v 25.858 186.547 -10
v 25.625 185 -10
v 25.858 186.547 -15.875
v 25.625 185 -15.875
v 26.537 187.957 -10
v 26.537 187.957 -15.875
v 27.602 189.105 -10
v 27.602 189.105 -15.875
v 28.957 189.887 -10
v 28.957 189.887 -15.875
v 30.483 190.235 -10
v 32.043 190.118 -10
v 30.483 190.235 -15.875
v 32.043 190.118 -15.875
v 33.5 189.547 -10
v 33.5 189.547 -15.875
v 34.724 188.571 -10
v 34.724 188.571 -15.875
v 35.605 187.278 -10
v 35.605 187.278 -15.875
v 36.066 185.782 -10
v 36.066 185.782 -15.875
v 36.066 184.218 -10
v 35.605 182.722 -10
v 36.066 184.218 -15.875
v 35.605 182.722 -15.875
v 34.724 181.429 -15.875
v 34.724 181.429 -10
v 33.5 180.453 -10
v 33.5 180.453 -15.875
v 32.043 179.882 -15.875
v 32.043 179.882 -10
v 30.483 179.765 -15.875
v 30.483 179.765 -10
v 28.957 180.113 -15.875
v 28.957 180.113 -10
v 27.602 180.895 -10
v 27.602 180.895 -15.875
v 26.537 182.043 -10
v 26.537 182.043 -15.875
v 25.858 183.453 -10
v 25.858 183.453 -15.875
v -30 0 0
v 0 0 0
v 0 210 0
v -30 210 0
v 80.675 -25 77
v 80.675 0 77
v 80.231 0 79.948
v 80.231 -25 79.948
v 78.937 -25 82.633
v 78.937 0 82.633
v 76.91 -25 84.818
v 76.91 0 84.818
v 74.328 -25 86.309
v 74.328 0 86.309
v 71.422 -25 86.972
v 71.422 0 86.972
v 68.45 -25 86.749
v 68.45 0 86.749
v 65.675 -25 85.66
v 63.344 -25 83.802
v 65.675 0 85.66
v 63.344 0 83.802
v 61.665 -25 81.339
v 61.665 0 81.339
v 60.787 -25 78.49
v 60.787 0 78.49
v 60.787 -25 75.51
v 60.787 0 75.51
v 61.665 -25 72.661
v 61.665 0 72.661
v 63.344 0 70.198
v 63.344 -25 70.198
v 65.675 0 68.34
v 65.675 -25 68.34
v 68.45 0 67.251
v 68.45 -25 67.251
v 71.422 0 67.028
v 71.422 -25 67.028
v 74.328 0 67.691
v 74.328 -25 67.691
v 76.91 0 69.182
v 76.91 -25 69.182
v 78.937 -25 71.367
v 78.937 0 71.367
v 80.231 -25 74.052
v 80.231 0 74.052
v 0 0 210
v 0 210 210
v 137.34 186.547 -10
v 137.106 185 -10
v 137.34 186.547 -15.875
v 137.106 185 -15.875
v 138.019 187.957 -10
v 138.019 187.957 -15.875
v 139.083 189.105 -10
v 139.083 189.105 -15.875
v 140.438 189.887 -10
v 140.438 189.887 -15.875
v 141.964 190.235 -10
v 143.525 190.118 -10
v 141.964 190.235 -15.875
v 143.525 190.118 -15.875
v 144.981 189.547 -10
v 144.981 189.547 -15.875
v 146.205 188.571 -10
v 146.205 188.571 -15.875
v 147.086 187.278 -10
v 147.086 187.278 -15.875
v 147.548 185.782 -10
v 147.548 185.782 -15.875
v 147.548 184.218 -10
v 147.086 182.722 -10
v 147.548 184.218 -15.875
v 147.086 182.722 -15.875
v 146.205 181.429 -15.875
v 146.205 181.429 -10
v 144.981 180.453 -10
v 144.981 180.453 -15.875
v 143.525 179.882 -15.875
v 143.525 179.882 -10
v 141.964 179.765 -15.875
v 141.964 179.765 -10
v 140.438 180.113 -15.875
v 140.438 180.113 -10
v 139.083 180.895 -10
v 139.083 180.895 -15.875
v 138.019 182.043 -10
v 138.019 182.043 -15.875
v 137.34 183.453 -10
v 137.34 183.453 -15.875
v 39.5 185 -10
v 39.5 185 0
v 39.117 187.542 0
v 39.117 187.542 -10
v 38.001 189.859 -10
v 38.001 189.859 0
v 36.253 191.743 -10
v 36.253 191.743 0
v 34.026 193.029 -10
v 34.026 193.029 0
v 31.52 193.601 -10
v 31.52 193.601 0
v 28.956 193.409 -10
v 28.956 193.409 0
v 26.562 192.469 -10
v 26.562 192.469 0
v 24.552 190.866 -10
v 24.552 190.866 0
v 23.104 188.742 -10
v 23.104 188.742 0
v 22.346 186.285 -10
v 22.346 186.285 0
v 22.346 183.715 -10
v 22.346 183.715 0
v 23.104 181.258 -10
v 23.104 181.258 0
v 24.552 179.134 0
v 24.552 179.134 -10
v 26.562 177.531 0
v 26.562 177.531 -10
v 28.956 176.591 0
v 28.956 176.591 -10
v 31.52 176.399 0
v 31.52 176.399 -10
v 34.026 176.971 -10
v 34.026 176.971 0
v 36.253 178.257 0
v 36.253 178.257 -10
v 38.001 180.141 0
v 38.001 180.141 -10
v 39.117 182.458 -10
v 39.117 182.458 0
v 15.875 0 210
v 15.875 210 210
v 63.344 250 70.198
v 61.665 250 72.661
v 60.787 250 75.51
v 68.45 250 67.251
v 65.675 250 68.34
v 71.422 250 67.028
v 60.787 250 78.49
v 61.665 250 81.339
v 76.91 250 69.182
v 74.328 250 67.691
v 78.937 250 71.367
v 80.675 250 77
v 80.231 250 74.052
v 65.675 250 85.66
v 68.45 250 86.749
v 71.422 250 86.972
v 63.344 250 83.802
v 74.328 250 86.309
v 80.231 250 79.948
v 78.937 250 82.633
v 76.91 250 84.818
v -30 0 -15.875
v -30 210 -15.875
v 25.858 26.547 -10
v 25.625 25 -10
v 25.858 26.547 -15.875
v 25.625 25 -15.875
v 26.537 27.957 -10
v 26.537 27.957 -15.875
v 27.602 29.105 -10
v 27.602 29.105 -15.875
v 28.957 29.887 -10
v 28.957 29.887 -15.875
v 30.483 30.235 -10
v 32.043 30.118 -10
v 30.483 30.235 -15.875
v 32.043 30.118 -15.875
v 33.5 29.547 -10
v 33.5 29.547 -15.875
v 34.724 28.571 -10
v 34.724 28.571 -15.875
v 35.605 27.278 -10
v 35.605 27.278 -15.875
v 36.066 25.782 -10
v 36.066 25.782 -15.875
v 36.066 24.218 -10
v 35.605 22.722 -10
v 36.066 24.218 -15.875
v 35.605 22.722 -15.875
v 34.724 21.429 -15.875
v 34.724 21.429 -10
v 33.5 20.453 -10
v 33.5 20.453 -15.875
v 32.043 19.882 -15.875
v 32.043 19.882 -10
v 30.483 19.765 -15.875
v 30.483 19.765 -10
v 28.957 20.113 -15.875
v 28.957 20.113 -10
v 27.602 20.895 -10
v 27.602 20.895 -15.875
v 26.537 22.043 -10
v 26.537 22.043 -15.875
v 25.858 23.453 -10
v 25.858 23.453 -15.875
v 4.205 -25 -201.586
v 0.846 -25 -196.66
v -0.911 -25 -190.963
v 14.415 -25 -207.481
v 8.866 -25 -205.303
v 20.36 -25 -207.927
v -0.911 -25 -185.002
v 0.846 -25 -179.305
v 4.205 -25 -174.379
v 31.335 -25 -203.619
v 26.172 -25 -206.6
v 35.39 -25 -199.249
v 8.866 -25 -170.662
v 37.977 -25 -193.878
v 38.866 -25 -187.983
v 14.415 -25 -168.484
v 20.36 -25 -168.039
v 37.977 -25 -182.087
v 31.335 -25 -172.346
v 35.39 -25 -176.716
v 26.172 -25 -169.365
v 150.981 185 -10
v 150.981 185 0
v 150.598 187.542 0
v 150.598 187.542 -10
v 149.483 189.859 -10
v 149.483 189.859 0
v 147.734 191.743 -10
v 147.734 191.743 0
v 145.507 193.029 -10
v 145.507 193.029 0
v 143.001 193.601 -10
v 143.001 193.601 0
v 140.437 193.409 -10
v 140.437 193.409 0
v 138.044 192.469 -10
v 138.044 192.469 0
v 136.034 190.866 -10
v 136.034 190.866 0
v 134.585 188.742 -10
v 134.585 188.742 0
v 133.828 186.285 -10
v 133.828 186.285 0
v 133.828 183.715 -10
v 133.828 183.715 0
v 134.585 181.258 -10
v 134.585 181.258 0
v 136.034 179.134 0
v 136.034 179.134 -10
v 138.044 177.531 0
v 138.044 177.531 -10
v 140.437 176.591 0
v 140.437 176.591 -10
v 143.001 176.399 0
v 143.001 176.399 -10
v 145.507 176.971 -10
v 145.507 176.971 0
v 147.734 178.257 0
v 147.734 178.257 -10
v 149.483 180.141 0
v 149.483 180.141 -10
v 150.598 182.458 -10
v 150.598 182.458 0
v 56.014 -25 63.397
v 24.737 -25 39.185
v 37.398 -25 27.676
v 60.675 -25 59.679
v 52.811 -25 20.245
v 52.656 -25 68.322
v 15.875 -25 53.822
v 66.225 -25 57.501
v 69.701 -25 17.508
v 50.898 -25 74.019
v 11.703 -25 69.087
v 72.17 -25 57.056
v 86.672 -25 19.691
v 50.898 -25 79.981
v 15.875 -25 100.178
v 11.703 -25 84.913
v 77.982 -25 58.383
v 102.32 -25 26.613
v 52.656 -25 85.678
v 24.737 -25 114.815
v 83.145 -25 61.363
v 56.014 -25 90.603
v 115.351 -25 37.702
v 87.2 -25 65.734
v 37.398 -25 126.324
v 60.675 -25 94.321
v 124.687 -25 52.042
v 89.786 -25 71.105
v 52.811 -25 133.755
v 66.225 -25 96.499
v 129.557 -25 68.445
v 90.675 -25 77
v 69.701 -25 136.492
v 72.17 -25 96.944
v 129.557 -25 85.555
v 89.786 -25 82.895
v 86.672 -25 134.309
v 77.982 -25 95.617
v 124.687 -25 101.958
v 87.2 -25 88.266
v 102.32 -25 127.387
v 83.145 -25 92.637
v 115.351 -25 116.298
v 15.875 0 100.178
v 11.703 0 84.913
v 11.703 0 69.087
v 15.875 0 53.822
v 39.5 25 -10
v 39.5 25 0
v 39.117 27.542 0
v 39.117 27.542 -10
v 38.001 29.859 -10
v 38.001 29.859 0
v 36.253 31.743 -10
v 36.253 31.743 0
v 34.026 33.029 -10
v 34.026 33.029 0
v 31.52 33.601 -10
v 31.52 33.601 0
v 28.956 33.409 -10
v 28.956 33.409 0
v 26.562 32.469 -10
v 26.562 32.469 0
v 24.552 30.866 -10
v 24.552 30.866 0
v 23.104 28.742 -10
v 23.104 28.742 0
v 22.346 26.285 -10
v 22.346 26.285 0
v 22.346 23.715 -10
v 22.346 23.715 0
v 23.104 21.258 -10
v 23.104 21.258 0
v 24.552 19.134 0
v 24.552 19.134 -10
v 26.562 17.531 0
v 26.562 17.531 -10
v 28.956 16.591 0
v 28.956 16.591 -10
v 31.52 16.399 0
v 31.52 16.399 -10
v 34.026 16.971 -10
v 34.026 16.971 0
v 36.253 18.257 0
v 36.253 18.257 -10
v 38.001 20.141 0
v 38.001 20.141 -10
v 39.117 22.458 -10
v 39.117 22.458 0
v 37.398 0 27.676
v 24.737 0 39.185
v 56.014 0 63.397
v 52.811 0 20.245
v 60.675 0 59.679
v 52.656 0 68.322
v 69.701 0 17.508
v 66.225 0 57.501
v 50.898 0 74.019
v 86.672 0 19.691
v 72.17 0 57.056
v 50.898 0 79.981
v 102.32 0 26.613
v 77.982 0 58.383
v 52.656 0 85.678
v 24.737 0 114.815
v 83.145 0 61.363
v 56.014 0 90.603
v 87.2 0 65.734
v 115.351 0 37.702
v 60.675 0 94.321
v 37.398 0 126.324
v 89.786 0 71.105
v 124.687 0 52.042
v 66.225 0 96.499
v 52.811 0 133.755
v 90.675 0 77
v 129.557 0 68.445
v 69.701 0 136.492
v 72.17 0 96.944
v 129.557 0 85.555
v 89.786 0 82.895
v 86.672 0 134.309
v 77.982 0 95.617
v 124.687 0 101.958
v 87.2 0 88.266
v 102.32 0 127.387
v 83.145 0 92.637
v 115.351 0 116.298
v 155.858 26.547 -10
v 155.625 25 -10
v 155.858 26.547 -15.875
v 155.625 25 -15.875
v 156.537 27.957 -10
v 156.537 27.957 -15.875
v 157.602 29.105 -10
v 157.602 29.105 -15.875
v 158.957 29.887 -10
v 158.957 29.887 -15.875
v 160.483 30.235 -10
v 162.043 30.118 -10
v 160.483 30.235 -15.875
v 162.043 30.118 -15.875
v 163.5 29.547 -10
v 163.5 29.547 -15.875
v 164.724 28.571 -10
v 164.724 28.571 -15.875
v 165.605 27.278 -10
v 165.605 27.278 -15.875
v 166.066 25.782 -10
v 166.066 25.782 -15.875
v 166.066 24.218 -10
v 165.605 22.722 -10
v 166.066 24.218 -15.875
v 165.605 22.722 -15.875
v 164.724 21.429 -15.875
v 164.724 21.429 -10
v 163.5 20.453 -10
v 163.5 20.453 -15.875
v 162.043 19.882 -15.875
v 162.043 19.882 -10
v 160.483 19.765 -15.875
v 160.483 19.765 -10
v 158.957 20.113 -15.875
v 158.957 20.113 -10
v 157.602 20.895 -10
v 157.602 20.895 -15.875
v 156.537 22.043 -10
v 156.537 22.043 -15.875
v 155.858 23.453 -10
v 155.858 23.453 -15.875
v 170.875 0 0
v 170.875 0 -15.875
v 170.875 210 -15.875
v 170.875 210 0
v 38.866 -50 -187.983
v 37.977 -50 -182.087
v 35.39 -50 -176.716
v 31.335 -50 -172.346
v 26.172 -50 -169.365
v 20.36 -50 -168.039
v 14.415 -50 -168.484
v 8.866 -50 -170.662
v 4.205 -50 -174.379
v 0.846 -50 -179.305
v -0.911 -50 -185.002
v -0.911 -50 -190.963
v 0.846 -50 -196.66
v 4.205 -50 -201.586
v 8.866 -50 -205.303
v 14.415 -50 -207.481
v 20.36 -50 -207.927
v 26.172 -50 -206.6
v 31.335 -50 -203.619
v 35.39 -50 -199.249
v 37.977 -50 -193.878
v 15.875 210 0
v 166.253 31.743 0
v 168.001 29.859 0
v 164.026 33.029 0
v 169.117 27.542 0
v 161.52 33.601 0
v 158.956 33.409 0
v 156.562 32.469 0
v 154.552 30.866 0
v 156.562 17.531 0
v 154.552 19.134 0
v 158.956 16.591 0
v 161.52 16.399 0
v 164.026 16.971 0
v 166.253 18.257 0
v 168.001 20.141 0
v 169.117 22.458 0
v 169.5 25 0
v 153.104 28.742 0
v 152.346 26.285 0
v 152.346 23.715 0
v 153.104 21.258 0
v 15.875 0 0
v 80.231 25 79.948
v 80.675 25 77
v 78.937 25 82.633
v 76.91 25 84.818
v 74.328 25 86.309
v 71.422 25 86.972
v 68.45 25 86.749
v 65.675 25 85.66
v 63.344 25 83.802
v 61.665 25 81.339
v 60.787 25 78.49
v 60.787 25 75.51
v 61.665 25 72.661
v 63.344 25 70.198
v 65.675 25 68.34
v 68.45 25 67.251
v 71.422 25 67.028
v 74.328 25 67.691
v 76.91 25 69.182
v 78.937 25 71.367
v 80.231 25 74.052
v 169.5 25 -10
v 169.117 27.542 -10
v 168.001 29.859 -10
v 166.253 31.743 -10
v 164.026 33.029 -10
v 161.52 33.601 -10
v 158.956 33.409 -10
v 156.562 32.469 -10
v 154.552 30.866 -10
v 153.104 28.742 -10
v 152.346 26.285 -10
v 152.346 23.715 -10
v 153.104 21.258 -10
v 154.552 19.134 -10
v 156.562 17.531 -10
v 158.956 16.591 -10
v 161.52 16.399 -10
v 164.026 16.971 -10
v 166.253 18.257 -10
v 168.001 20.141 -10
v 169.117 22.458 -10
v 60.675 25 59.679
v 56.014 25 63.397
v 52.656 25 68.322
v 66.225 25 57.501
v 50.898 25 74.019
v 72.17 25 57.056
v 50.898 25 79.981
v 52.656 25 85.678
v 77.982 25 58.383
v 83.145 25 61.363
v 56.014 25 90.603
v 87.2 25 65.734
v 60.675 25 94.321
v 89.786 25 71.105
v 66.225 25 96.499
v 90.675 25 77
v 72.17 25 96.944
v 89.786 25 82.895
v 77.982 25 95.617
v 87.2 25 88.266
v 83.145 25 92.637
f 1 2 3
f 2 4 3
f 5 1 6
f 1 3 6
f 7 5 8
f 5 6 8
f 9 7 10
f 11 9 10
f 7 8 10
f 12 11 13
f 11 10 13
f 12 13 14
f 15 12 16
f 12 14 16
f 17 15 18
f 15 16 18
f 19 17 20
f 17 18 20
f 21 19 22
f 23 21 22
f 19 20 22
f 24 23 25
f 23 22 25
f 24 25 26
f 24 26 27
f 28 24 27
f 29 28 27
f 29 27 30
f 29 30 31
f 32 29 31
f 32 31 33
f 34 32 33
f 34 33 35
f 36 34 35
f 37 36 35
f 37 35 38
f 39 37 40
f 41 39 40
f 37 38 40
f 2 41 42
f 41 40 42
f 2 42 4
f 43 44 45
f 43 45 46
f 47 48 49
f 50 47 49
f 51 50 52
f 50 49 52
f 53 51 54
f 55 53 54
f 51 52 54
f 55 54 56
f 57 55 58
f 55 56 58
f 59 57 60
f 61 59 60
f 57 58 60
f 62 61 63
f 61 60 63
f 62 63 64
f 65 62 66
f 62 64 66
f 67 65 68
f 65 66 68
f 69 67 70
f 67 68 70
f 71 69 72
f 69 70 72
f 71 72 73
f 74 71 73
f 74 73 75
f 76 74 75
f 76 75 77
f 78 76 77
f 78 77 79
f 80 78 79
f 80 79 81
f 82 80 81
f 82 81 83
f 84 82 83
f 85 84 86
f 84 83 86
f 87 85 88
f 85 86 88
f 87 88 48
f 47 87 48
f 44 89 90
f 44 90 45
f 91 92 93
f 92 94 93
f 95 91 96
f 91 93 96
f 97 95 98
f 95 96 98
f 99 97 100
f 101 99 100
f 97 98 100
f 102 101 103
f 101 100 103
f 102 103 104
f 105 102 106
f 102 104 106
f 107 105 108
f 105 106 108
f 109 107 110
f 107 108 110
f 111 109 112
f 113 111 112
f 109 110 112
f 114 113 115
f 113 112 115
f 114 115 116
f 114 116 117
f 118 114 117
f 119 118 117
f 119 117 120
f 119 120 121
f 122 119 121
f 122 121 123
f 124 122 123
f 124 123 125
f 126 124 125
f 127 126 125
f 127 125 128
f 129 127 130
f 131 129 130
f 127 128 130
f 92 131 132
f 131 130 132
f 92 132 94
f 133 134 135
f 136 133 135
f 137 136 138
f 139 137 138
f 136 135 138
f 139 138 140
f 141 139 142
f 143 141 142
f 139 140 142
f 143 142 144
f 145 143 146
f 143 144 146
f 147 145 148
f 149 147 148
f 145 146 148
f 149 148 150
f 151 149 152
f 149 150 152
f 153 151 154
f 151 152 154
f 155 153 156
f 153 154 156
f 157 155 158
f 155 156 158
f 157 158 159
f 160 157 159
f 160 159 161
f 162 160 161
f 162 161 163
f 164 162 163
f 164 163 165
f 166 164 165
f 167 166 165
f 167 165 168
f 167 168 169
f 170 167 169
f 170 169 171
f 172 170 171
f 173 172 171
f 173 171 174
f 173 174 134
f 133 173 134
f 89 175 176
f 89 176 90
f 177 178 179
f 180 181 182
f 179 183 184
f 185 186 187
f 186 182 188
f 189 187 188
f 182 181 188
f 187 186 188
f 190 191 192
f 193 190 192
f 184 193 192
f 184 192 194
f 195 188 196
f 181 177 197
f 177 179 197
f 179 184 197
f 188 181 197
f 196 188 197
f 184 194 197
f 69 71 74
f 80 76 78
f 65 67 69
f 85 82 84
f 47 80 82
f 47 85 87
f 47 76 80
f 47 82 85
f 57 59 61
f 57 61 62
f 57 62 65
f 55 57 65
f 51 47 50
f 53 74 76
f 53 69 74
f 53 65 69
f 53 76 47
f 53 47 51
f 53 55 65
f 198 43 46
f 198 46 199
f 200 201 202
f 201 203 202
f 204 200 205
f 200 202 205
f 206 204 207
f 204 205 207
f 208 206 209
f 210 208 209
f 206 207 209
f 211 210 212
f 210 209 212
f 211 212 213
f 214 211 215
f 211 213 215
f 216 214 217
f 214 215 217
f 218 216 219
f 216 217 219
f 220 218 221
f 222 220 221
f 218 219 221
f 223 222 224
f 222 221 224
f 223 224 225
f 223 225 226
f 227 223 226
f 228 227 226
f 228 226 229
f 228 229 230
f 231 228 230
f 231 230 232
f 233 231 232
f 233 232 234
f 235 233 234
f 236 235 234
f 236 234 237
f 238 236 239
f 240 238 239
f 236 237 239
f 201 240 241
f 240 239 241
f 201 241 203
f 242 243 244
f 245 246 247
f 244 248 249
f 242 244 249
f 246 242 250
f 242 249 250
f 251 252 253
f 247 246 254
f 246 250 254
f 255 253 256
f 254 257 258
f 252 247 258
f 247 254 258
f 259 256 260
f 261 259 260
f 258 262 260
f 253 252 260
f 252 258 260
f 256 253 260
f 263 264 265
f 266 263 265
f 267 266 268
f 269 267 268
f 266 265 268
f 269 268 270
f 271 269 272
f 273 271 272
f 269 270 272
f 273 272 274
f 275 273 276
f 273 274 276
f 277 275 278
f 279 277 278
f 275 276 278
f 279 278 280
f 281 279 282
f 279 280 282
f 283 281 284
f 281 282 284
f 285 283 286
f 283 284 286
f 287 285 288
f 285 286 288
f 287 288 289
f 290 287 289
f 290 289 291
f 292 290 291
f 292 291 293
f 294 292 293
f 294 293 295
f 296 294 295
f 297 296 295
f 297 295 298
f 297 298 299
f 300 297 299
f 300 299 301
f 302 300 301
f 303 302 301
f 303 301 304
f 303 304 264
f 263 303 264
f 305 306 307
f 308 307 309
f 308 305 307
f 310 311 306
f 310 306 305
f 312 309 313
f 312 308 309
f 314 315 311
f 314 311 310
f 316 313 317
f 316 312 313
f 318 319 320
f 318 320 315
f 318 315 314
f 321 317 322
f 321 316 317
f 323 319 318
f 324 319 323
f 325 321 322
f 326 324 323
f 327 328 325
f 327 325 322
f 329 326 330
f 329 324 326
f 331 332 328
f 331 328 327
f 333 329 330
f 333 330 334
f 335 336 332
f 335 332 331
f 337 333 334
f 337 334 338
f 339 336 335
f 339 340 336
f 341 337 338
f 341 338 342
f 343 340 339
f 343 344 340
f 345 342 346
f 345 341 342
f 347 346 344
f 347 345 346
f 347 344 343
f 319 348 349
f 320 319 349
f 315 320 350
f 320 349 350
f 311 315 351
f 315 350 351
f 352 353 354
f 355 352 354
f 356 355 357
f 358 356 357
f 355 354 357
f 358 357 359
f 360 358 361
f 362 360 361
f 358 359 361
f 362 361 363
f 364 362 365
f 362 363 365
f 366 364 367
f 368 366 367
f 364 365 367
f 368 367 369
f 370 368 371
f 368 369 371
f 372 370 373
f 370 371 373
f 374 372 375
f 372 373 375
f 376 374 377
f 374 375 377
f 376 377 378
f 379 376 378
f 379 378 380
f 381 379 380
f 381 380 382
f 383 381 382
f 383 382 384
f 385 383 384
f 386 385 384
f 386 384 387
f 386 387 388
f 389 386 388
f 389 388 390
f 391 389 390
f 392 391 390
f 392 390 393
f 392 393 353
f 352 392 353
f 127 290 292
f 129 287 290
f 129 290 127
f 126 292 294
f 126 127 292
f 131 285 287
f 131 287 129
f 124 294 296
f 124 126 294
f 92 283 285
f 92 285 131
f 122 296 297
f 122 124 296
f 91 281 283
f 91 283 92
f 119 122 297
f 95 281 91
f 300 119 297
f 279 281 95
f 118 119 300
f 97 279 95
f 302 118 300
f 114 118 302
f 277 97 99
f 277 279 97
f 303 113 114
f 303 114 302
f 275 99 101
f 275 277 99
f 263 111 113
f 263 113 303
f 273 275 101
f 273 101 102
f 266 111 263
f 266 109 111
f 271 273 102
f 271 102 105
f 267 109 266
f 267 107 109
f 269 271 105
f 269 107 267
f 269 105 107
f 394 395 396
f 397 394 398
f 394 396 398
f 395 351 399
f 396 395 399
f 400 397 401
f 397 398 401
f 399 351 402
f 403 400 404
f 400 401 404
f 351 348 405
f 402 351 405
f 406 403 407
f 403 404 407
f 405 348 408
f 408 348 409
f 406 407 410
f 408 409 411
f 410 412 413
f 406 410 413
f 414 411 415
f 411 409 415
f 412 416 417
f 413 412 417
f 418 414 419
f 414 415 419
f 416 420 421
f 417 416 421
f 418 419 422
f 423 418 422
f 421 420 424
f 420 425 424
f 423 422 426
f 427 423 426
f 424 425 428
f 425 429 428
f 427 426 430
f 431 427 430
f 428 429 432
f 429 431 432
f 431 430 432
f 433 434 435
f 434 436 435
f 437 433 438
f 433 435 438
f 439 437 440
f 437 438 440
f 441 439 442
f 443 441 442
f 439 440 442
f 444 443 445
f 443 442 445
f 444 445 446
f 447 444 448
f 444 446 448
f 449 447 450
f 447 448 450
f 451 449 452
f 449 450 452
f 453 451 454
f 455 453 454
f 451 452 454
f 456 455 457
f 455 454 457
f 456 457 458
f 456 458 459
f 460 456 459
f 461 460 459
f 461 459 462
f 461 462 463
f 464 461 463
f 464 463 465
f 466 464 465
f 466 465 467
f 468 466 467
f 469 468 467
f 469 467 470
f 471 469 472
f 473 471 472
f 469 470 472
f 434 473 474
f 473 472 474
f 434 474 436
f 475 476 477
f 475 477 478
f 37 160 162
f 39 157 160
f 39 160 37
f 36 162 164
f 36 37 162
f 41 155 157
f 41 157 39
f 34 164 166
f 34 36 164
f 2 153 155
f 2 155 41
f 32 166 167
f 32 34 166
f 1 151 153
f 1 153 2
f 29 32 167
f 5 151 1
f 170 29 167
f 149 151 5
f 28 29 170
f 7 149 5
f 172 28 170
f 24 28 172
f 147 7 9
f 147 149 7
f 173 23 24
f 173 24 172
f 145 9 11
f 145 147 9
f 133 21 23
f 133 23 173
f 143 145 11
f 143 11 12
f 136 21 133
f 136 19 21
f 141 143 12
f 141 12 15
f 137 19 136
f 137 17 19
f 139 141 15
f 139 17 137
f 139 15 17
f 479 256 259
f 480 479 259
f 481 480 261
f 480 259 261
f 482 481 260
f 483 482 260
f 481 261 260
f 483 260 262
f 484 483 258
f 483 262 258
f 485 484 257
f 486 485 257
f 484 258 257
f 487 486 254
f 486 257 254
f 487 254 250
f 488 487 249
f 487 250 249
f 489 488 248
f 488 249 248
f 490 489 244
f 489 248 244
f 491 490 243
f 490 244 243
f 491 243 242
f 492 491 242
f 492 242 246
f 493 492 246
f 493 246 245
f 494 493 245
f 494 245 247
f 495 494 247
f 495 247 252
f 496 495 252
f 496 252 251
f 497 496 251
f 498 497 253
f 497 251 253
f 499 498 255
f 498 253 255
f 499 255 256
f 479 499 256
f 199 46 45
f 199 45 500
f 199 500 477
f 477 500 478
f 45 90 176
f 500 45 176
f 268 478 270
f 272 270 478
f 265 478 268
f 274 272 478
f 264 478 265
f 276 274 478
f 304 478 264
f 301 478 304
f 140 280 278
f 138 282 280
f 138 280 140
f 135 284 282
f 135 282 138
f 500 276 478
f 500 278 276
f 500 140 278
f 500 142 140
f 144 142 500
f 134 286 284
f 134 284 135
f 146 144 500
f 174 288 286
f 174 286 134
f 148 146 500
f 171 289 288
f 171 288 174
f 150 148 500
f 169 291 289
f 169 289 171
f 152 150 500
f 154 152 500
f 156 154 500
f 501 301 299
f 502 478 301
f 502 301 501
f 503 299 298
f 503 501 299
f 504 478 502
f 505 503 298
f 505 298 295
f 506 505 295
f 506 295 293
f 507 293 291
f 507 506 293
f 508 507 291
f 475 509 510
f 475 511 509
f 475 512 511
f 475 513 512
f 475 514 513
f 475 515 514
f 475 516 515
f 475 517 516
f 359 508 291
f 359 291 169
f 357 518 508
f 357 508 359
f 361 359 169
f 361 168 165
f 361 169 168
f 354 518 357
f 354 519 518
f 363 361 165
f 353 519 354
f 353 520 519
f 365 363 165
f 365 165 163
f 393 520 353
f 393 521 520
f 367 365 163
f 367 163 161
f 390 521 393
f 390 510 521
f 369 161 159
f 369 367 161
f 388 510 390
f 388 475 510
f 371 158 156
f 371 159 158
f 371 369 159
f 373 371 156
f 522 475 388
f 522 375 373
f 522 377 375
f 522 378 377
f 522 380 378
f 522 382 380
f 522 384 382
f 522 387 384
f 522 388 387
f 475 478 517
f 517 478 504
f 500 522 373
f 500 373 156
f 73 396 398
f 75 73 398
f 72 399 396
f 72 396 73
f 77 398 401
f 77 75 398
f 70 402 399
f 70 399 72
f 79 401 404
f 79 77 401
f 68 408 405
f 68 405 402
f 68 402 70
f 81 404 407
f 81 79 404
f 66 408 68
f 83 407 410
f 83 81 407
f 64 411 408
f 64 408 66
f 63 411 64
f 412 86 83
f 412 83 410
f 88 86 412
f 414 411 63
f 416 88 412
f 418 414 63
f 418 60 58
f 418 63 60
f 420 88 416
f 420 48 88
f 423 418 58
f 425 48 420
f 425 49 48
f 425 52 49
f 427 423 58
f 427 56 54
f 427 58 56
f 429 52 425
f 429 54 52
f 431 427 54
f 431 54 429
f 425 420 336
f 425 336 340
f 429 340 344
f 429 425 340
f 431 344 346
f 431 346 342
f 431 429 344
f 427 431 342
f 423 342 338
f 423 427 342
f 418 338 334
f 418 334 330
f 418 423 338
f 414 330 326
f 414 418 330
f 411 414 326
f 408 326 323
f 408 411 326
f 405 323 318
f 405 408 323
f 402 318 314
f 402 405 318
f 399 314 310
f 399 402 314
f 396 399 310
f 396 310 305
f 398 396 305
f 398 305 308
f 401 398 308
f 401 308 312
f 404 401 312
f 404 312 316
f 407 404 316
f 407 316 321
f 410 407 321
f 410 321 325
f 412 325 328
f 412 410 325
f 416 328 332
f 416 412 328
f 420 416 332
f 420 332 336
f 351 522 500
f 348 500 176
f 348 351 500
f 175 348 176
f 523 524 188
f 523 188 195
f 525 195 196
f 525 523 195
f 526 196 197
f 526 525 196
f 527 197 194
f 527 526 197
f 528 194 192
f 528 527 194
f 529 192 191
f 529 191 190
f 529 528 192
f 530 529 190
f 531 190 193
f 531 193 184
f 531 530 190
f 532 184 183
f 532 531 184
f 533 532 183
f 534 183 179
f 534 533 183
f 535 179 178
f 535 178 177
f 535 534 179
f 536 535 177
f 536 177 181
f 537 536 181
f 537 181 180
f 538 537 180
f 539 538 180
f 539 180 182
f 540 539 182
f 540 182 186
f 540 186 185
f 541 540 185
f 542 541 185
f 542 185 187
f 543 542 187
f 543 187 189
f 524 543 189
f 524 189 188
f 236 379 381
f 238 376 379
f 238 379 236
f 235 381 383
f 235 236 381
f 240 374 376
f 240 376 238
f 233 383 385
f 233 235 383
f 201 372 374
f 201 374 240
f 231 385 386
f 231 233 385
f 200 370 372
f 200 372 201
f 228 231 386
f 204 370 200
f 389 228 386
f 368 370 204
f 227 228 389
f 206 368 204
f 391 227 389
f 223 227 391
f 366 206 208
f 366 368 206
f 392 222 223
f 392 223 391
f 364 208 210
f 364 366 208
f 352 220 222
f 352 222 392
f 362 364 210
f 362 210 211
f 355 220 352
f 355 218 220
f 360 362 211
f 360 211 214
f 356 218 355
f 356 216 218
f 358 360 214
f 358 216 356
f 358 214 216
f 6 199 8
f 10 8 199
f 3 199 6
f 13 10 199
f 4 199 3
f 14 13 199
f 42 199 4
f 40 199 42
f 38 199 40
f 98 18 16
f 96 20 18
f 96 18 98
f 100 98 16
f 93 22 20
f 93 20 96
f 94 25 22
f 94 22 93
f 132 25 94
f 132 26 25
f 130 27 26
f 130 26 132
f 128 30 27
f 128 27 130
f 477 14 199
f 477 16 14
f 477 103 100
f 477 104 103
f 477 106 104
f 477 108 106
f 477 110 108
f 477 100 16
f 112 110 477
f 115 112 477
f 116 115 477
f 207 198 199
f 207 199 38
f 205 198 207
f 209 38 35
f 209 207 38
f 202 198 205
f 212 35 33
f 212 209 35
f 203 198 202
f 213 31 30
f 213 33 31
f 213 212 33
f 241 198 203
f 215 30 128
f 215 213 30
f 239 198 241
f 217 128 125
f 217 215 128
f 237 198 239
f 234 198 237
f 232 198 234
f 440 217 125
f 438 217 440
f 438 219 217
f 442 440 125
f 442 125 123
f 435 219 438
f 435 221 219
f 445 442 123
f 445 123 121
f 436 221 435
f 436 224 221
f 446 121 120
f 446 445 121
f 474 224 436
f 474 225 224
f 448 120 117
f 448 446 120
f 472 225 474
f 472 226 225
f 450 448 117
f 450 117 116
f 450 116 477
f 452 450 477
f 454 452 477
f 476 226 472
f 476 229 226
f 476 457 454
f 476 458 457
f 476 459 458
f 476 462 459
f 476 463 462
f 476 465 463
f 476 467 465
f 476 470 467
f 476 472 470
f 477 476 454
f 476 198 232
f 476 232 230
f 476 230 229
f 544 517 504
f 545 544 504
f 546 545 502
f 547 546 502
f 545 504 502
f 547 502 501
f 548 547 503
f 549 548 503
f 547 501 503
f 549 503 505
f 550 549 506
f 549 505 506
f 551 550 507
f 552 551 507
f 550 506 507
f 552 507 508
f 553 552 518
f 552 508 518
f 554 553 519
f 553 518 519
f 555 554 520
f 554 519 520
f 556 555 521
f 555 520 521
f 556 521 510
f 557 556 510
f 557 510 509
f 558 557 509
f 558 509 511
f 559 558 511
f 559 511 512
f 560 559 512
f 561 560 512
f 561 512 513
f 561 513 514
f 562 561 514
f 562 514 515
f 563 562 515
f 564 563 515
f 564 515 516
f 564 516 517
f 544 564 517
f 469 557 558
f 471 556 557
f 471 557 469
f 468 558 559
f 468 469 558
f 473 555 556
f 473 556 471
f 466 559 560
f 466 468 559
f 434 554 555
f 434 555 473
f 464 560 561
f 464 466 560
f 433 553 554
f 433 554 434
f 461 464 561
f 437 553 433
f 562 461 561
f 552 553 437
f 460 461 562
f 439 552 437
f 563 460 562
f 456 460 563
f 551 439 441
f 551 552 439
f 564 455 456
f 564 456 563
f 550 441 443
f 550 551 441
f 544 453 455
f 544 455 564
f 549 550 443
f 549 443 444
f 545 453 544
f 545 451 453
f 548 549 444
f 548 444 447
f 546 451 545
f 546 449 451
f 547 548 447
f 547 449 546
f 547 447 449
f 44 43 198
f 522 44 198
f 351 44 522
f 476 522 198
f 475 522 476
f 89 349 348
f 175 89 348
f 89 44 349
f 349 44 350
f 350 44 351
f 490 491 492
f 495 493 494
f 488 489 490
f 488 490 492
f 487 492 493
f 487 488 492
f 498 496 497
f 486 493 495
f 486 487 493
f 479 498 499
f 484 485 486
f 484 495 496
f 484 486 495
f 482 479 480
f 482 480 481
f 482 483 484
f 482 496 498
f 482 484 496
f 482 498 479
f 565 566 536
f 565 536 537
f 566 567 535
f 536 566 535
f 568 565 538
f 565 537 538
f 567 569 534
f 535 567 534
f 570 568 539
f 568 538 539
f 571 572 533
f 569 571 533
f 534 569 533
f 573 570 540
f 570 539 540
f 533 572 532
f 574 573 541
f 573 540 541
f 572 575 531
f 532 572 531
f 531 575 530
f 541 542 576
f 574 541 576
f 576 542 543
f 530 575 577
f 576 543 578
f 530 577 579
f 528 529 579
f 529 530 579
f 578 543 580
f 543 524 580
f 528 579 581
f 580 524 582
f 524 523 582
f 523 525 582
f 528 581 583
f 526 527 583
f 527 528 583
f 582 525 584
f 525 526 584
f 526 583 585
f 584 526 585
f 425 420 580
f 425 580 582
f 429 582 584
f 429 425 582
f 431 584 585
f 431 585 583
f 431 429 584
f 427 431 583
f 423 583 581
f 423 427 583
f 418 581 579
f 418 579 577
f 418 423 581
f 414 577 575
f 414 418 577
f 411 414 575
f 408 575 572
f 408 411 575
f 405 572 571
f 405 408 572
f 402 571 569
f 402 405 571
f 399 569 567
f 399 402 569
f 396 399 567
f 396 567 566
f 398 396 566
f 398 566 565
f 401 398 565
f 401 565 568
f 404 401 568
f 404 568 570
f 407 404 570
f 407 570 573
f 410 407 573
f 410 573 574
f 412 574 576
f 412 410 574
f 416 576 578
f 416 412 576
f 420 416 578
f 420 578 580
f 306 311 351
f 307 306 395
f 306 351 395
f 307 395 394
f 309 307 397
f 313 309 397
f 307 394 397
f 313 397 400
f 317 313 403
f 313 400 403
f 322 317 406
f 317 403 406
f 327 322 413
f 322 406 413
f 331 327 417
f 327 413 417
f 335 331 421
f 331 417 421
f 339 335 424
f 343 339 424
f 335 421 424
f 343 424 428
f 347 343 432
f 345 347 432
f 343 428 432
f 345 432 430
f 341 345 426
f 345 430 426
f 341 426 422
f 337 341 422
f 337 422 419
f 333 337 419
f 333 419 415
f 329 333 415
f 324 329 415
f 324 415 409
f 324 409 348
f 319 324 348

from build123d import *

# Parameters (mm, degrees)
F1_DEPTH       = 210
F3_D           = 10.5
F3_CBORE_D     = 17.25
F3_CBORE_DEPTH = 10
F4_R           = 20
F5_DEPTH       = 25
F4_R_2         = 10
F6_DEPTH       = 25
F7_DEPTH       = 25
F7_DEPTH_BACK  = 250
F8_R           = 20
F9_DEPTH       = 25


with BuildPart() as f1:
    # F0 (on Front) → F1 (new body)
    with BuildSketch(Plane.XZ):
        Polygon((0, 210), (0, 0), (-30, 0), (-30, -15.875), (170.875, -15.875), (170.875, 0), (15.875, 0), (15.875, 210), align=None)
    extrude(amount=-F1_DEPTH)

    # F3 (through all)
    with Locations(Plane.XY):
        with Locations((30.875, 25), (160.875, 25), (142.3562726393, 185), (30.875, 185)):
            CounterBoreHole(F3_D / 2, F3_CBORE_D / 2, F3_CBORE_DEPTH)

    # F4 (on face) → F5 (join)
    with BuildSketch(Plane.XZ):
        with BuildLine():
            Line((15.875, 53.8222089059), (15.875, 100.1777910941))
            ThreePointArc((15.875, 100.1777910941), (11.175, 77), (15.875, 53.8222089059))
        make_face()
        with BuildLine():
            ThreePointArc((15.875, 53.8222089059), (82.4997621541, 18.6868368205), (130.175, 77))
            ThreePointArc((130.175, 77), (82.4997621541, 135.3131631795), (15.875, 100.1777910941))
            Line((15.875, 100.1777910941), (15.875, 53.8222089059))
        make_face()
        with Locations((70.675, 77)):
            Circle(F4_R, mode=Mode.SUBTRACT)
    extrude(amount=F5_DEPTH)

    # F4 (on face) → F6 (join)
    with BuildSketch(Plane.XZ):
        with Locations((70.675, 77)):
            Circle(F4_R)
        with Locations((70.675, 77)):
            Circle(F4_R_2, mode=Mode.SUBTRACT)
    extrude(amount=-F6_DEPTH)

    # F4 (on face) → F7 (join, two sides)
    with BuildSketch(Plane.XZ) as f7_sk:
        with Locations((70.675, 77)):
            Circle(F4_R_2)
    extrude(amount=F7_DEPTH)
    extrude(f7_sk.sketch, amount=-F7_DEPTH_BACK)


with BuildPart() as f9:
    # F8 (on face) → F9 (new body)
    with BuildSketch(Plane.XZ.offset(25)):
        with Locations((18.8655378835, -187.9826025142)):
            Circle(F8_R)
    extrude(amount=F9_DEPTH)


solid = Compound([f1.part, f9.part])
